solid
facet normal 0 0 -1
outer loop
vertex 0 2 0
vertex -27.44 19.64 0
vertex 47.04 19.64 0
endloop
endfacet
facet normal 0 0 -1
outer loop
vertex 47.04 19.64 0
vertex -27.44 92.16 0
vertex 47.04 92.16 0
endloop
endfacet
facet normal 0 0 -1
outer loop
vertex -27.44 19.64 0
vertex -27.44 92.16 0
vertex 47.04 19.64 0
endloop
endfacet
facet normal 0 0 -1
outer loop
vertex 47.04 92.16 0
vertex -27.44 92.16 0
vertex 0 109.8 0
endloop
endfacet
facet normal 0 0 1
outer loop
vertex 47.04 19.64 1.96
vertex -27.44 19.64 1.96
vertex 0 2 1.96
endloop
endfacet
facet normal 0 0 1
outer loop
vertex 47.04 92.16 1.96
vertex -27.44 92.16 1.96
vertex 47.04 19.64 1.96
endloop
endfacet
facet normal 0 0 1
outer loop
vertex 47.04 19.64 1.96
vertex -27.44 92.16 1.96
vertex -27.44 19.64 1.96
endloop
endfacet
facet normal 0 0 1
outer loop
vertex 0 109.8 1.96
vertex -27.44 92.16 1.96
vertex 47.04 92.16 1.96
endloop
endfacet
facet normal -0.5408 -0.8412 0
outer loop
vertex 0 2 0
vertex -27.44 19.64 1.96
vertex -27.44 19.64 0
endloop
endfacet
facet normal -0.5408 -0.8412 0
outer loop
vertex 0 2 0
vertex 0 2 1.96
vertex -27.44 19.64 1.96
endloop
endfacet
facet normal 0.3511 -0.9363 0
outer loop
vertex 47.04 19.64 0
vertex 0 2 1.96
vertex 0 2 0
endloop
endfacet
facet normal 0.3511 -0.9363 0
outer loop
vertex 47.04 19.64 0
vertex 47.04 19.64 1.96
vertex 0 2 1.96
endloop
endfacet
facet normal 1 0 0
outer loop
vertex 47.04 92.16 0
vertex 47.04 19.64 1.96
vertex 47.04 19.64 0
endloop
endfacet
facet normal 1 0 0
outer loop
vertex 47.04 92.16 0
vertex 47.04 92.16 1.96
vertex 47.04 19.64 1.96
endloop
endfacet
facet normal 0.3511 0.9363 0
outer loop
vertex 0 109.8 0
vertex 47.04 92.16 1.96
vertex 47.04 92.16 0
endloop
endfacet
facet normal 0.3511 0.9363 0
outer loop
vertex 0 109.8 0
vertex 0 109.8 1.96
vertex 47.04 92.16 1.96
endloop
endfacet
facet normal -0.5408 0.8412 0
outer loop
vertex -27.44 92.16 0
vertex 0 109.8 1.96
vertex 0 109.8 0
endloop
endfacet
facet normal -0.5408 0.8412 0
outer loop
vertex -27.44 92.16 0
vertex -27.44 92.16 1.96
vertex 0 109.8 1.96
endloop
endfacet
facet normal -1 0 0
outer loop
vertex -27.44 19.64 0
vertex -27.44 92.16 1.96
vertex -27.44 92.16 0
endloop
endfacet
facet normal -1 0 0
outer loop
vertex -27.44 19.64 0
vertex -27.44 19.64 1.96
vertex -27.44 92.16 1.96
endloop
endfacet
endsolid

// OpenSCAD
$t=2;





$h1=2;

translate([0,2,0])
scale(0.98)

    
    linear_extrude($h1){
    
    
polygon([[0,0],[48,18],[48,92],[0,110]]);

polygon([[0,0],[-28,18],[-28,92],[0,110]]);
}
